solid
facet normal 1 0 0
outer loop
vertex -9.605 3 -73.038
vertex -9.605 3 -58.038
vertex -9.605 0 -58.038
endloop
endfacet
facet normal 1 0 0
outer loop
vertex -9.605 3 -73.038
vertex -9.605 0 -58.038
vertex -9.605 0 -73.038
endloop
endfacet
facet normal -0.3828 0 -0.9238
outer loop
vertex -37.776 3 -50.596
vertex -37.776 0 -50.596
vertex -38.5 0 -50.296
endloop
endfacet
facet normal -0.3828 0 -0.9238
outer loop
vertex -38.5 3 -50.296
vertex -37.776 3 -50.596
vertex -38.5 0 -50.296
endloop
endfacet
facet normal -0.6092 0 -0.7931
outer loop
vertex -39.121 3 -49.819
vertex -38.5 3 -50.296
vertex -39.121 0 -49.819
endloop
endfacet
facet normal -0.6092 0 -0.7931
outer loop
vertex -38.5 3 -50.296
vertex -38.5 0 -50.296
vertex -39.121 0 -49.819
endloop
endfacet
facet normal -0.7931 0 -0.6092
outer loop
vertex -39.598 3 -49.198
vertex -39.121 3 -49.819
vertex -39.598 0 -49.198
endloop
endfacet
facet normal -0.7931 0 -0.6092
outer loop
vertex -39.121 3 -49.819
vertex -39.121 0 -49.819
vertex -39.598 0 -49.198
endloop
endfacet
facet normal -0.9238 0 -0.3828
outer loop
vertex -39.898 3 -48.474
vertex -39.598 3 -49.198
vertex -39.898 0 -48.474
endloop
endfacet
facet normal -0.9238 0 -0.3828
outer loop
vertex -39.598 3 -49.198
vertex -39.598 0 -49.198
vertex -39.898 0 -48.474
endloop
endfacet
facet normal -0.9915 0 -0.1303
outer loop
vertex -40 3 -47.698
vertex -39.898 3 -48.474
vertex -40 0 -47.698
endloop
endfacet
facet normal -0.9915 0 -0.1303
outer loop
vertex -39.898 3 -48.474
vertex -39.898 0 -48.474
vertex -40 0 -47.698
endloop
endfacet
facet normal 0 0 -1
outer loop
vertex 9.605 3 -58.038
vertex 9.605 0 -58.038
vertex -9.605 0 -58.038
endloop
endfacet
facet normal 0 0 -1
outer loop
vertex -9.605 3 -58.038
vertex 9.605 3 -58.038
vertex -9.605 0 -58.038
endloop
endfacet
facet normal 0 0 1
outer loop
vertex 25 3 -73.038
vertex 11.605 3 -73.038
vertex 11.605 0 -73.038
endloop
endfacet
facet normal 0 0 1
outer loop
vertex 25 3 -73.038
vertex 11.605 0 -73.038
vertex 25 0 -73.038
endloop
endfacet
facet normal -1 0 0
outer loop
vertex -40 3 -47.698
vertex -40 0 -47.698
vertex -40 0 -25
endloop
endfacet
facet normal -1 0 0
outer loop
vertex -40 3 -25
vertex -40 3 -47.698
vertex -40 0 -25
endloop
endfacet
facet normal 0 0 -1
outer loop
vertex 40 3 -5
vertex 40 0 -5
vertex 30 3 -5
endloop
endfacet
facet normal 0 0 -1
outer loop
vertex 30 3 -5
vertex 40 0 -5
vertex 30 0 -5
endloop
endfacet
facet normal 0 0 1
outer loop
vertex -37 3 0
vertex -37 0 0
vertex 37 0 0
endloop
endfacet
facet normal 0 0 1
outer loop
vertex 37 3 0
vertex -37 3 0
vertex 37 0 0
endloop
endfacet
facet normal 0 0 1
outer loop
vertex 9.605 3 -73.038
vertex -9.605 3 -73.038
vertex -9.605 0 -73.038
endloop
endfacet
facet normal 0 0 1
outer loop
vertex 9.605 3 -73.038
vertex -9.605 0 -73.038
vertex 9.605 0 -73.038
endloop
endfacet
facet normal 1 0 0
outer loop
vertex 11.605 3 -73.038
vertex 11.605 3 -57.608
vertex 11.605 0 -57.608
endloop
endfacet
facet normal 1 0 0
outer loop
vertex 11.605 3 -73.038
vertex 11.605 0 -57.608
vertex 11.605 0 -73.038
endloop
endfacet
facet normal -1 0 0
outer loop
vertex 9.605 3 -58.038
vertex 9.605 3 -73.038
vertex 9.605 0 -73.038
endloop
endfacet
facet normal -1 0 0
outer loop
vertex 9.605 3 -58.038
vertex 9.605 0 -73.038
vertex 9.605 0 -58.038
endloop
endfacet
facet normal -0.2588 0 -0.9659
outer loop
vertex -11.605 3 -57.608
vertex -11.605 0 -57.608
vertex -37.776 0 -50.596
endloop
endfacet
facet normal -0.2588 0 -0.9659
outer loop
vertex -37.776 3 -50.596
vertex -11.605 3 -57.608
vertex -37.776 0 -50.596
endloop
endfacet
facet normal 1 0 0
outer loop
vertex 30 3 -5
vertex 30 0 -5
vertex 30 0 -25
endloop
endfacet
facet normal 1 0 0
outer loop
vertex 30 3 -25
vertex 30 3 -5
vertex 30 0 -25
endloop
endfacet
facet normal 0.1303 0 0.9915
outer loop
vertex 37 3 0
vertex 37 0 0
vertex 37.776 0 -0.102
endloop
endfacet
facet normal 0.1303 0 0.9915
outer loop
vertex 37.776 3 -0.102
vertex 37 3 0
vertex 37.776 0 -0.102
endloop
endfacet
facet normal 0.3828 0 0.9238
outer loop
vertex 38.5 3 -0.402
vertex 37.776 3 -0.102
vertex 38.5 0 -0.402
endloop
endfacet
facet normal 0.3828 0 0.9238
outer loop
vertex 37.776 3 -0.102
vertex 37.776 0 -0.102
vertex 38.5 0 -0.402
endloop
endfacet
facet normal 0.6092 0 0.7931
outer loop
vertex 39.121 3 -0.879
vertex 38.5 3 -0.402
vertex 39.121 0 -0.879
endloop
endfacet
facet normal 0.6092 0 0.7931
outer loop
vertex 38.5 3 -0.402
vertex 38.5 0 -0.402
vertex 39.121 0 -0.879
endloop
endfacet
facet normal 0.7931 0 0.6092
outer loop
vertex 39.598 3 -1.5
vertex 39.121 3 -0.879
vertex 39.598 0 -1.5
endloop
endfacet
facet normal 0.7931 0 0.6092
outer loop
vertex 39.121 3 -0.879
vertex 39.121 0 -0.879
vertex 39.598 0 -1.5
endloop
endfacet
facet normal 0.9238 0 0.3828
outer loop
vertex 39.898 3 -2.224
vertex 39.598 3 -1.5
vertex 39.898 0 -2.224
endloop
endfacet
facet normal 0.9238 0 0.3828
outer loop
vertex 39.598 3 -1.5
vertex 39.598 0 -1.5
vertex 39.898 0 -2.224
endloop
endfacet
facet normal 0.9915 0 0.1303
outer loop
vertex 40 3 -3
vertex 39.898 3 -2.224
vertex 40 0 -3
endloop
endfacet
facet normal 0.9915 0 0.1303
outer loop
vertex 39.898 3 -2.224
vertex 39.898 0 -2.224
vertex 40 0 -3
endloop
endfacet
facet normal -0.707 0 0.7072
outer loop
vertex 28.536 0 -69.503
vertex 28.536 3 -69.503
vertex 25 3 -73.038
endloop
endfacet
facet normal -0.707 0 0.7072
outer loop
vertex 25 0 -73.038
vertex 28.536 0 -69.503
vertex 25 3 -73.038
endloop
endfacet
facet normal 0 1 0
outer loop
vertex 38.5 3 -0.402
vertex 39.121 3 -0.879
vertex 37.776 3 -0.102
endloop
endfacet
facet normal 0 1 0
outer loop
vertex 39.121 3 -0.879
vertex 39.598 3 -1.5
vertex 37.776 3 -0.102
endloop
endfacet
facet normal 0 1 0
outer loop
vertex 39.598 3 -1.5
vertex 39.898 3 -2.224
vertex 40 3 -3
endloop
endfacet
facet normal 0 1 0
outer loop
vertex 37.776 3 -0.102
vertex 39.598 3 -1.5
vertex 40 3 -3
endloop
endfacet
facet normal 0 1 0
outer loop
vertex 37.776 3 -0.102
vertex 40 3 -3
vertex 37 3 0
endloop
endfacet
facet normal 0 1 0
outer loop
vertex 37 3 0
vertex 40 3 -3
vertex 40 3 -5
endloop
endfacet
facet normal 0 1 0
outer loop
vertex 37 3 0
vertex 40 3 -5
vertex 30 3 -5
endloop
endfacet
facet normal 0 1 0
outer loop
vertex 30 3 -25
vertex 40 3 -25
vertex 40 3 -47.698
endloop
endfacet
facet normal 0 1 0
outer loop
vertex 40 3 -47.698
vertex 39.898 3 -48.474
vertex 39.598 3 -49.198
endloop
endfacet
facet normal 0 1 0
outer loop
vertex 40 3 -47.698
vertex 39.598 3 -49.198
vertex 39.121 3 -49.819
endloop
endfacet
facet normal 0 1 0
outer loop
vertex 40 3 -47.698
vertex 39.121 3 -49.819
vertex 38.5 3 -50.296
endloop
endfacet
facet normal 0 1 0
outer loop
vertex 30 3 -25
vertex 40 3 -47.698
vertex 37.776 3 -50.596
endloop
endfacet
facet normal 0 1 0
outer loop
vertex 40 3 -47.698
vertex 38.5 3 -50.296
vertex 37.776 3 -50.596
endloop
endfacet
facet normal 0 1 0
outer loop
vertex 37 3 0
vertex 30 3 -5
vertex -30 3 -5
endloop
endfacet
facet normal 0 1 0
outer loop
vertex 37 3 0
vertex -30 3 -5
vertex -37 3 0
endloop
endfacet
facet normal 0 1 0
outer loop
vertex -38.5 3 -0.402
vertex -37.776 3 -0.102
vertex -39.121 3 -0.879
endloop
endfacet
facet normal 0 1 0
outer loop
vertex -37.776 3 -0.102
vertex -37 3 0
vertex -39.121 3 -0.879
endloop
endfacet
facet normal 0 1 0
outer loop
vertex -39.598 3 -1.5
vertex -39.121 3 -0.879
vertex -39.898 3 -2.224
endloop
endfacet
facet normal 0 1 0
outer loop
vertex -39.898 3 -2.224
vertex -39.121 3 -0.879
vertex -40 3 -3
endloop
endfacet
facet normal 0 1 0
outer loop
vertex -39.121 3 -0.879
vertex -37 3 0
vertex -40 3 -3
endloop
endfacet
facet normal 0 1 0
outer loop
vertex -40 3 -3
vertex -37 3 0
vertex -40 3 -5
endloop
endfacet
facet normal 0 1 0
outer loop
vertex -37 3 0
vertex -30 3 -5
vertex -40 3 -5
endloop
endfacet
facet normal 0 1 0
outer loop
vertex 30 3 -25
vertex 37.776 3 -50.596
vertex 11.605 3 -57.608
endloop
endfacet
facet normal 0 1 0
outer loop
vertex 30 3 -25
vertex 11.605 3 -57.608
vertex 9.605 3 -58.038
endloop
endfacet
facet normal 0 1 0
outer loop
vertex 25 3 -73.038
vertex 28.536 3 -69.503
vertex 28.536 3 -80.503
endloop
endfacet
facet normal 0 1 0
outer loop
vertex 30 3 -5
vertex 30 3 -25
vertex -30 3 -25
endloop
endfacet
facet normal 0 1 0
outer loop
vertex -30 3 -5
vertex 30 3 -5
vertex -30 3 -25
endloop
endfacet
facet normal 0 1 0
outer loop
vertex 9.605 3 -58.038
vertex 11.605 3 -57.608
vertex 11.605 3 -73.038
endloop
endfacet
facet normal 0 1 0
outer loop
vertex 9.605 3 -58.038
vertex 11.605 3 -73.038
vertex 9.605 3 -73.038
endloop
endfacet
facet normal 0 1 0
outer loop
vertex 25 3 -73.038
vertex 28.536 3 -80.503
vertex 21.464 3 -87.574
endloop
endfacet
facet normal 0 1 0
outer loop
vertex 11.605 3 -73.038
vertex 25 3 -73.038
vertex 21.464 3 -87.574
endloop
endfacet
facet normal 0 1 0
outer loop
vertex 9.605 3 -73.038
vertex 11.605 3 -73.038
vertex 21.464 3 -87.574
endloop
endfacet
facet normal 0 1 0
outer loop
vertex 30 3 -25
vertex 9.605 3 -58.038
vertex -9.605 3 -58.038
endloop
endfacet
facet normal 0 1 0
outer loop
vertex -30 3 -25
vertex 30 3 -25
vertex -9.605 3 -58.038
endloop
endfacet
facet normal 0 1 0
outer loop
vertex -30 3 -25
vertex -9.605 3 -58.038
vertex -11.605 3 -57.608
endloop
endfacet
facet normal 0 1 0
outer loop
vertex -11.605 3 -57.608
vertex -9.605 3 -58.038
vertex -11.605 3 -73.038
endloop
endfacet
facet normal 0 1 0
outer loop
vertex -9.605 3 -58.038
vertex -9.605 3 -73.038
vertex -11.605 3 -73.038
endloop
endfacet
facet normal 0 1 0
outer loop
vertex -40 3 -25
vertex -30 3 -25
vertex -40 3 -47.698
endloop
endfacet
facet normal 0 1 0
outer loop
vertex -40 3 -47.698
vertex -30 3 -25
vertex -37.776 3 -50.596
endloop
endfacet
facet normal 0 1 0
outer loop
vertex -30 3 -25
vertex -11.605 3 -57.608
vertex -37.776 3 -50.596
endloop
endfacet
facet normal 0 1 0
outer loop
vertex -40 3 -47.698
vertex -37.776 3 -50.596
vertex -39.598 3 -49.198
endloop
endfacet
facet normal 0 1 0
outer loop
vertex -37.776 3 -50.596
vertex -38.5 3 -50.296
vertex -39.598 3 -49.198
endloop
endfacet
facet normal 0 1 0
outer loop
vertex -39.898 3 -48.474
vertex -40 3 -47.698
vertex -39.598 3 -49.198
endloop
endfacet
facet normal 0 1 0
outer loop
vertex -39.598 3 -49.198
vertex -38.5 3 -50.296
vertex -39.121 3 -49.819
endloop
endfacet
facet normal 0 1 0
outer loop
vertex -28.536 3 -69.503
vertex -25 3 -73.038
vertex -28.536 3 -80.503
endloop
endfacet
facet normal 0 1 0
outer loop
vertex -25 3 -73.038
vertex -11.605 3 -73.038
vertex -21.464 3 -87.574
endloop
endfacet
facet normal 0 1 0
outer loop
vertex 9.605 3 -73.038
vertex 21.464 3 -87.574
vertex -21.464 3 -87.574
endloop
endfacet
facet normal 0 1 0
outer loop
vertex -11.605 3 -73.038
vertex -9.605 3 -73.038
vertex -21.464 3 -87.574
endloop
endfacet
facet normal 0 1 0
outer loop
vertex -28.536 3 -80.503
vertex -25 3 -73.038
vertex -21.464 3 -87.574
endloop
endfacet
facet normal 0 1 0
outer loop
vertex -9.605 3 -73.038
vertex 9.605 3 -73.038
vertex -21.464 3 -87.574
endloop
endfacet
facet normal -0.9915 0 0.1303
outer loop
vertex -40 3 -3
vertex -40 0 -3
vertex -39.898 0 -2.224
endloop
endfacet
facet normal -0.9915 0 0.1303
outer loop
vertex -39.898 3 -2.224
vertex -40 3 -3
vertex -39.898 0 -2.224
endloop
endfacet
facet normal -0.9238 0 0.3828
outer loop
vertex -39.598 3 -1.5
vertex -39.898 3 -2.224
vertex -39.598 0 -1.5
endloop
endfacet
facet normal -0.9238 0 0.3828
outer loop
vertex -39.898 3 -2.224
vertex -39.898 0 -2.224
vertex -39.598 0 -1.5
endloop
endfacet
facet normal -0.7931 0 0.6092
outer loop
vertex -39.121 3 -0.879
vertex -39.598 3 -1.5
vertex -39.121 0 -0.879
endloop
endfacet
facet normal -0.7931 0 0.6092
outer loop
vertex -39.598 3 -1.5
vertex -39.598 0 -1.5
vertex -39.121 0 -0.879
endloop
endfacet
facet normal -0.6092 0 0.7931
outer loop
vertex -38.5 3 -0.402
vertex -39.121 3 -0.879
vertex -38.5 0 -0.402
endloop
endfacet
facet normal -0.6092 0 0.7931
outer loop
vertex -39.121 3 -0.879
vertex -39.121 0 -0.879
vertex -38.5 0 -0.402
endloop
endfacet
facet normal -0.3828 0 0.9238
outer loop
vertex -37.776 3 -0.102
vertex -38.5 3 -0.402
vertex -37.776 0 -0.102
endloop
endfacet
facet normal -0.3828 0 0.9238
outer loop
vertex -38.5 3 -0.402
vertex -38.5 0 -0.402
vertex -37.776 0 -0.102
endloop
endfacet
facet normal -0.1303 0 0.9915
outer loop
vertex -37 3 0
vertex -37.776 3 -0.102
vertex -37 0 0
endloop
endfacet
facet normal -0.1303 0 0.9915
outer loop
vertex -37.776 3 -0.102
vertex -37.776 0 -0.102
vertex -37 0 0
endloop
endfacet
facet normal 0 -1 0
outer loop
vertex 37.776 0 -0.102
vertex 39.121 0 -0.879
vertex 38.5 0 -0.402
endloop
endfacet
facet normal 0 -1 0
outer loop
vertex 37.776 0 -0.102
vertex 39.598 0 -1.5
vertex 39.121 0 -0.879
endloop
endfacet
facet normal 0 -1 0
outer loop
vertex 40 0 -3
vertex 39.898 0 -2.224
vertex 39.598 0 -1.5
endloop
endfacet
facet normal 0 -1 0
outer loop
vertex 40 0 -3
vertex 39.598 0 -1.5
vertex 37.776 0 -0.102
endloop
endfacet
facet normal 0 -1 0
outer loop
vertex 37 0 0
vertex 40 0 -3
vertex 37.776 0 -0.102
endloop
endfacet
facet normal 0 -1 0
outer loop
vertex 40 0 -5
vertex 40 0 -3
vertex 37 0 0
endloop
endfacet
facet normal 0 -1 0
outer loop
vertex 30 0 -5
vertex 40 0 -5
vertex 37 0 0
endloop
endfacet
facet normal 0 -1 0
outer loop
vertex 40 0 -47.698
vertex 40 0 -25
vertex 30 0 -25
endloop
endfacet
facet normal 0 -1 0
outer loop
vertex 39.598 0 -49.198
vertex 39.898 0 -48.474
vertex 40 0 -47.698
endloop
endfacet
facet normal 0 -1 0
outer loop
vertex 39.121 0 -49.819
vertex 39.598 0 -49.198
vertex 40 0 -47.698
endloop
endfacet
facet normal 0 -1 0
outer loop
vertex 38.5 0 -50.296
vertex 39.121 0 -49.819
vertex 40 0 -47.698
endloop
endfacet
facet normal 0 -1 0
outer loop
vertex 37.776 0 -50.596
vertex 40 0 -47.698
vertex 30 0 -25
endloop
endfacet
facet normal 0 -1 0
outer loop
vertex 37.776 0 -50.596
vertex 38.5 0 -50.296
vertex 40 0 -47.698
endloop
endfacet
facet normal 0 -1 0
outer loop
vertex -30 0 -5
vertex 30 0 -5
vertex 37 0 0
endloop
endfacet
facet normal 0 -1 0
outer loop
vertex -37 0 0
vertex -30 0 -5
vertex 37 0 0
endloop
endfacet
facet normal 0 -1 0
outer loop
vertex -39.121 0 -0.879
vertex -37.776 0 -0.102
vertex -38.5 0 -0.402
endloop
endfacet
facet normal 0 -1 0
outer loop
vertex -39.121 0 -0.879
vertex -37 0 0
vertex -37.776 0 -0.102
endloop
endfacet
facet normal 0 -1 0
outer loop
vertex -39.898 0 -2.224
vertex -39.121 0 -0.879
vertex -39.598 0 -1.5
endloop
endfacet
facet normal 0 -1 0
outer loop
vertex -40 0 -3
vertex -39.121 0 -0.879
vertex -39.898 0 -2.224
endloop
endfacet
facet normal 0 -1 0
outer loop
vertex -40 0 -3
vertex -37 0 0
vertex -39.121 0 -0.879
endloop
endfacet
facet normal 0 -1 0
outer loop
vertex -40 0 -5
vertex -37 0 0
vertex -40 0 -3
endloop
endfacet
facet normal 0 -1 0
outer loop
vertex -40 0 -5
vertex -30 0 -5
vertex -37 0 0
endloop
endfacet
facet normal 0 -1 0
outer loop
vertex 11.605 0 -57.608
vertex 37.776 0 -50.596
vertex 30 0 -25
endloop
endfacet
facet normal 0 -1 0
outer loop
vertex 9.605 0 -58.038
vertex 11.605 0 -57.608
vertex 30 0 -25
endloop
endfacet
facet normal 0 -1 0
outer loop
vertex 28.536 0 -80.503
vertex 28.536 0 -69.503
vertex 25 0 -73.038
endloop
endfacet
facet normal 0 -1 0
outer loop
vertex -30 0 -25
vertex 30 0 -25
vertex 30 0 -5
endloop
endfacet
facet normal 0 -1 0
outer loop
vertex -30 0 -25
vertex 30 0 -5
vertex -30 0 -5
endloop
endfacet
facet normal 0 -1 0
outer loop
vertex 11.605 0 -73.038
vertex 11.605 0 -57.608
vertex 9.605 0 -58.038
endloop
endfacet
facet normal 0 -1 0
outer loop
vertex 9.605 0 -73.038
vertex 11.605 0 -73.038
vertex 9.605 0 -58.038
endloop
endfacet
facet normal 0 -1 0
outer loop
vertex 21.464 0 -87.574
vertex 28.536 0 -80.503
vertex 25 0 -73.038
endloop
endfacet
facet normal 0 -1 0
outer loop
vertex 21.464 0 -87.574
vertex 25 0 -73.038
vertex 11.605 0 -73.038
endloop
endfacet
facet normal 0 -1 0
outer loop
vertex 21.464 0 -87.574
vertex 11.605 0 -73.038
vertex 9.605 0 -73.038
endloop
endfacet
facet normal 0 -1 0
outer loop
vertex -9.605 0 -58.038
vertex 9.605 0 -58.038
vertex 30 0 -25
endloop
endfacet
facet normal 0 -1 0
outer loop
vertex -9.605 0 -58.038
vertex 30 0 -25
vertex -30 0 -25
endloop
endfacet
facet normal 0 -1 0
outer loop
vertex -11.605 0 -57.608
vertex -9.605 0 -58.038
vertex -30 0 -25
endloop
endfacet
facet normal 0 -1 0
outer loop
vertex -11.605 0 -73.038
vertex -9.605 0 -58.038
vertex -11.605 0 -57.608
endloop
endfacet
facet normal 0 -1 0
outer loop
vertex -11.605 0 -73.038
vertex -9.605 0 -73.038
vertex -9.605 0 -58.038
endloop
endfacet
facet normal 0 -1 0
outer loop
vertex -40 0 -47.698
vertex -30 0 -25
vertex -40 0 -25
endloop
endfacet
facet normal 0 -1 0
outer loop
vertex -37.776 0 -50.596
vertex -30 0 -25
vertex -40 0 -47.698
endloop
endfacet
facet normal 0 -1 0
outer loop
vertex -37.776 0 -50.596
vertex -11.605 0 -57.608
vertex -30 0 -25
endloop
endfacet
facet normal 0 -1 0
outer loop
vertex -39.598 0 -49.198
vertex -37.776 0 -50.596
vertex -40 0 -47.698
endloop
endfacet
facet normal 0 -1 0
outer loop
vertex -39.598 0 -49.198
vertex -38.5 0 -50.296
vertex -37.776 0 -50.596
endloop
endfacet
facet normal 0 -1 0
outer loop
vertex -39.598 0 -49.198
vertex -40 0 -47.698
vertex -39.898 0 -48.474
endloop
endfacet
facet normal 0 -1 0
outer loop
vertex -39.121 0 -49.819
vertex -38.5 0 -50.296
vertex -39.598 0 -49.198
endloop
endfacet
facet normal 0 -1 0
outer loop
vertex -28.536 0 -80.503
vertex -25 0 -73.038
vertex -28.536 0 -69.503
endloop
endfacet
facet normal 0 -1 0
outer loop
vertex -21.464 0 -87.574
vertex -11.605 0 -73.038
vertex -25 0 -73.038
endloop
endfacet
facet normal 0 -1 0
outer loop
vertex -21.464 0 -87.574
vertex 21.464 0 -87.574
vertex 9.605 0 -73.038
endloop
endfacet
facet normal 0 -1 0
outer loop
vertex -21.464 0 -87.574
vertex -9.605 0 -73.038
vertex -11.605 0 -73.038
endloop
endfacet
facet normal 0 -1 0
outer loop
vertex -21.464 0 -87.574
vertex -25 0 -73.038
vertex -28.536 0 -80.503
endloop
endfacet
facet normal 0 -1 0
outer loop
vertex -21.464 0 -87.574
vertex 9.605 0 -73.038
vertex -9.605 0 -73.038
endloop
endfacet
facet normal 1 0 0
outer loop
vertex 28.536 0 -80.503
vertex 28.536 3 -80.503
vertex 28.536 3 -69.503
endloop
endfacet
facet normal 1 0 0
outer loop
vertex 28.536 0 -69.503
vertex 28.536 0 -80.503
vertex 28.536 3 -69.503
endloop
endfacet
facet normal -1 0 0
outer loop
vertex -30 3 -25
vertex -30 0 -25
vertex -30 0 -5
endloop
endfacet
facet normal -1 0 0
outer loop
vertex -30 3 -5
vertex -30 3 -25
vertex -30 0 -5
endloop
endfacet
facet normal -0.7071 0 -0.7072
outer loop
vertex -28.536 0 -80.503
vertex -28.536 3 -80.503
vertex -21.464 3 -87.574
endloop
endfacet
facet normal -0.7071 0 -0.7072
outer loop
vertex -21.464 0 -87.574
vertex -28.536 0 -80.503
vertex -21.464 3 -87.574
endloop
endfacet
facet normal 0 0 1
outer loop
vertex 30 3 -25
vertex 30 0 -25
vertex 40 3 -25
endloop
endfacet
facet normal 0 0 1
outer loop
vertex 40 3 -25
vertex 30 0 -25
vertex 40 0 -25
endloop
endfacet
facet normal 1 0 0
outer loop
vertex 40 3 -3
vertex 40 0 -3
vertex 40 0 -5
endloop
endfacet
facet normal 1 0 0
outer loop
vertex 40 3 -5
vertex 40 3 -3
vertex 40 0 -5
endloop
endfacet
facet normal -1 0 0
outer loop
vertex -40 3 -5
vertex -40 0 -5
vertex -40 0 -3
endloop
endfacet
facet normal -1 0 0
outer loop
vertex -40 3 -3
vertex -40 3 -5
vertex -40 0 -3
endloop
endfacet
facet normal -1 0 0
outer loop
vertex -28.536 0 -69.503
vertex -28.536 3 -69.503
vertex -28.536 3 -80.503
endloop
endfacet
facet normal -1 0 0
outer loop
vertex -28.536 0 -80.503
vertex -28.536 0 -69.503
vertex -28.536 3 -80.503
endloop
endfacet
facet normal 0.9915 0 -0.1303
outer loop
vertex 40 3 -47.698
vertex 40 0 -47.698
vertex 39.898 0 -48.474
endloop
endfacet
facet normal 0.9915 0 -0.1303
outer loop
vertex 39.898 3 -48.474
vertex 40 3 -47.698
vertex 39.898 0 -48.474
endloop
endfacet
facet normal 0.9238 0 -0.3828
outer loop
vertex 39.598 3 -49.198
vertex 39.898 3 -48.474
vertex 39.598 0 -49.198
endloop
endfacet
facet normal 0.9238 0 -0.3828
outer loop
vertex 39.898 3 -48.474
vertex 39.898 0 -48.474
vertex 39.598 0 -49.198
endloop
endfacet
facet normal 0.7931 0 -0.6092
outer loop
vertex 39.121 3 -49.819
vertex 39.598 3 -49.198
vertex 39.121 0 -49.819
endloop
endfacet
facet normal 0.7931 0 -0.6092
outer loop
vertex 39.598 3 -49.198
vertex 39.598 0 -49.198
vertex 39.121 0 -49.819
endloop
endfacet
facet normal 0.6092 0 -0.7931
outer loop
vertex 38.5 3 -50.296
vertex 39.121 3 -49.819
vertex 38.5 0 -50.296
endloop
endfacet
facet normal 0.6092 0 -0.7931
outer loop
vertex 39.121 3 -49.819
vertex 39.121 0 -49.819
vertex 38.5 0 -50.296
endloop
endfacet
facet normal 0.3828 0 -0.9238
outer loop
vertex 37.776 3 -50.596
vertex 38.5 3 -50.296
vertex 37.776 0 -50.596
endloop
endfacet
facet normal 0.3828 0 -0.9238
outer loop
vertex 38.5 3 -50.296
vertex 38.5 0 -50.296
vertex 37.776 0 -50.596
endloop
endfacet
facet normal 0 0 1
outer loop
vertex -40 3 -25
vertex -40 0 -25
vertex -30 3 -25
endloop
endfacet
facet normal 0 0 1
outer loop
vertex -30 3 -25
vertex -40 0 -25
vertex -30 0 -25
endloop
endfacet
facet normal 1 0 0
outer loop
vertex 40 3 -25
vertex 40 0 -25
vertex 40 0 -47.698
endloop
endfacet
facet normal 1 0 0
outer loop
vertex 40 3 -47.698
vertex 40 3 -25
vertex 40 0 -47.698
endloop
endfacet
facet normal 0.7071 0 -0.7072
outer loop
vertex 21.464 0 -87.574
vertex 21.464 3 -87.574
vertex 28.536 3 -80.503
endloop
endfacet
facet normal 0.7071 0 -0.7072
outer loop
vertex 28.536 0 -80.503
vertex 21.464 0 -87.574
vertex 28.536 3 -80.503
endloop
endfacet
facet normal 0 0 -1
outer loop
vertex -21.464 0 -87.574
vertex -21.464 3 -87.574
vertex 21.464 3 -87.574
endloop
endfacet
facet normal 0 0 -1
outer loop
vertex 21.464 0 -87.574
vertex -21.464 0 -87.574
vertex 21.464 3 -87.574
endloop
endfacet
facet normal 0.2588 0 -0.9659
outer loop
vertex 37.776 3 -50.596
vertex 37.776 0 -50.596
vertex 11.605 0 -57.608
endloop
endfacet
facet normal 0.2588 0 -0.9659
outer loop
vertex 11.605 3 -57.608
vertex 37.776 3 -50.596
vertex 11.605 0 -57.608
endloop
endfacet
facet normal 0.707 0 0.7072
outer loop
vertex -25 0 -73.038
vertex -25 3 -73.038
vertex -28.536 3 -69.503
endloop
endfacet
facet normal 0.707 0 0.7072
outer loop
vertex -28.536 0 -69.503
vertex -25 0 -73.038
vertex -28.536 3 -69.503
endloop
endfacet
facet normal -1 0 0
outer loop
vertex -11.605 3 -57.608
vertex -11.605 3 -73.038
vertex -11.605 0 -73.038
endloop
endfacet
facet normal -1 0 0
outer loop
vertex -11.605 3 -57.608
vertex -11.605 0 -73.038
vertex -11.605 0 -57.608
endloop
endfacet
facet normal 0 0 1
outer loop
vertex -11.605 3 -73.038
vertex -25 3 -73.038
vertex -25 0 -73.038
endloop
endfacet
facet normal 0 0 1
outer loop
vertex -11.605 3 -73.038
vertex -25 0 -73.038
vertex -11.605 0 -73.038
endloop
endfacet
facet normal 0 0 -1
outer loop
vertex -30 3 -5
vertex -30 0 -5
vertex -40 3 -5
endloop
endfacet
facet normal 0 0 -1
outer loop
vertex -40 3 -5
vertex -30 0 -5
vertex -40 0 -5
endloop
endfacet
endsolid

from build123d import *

# Parameters (mm, degrees)
BOSS_EXTRUDE1_DEPTH = 3
BOSS_EXTRUDE2_DEPTH = 3
BOSS_EXTRUDE3_DEPTH = 3


with BuildPart() as part:
    # Sketch1 → Boss-Extrude1 (new body)
    with BuildSketch(Plane(origin=(0, 0, 0), x_dir=(1, 0, 0), z_dir=(0, 1, 0))):
        with BuildLine():
            Line((9.605042507, 58.038475773), (-9.605042507, 58.038475773))
            ThreePointArc((-9.605042507, 58.038475773), (-9.996621084, 58.012810357), (-10.381499643, 57.936253252))
            Line((-10.381499643, 57.936253252), (-37.776457135, 50.595796515))
            ThreePointArc((-37.776457135, 50.595796515), (-39.380060021, 49.524303323), (-40, 47.698019036))
            Line((-40, 47.698019036), (-40, 25))
            Line((-40, 25), (-30, 25))
            Line((-30, 25), (-30, 5))
            Line((-30, 5), (-40, 5))
            Line((-40, 5), (-40, 3))
            ThreePointArc((-40, 3), (-39.121320344, 0.878679656), (-37, 0))
            Line((-37, 0), (37, 0))
            ThreePointArc((37, 0), (39.121320344, 0.878679656), (40, 3))
            Line((40, 3), (40, 5))
            Line((40, 5), (30, 5))
            Line((30, 5), (30, 25))
            Line((30, 25), (40, 25))
            Line((40, 25), (40, 47.698019036))
            ThreePointArc((40, 47.698019036), (39.380060021, 49.524303323), (37.776457135, 50.595796515))
            Line((37.776457135, 50.595796515), (10.381499643, 57.936253252))
            ThreePointArc((10.381499643, 57.936253252), (9.996621084, 58.012810357), (9.605042507, 58.038475773))
        make_face()
    extrude(amount=BOSS_EXTRUDE1_DEPTH)

    # Sketch3 → Boss-Extrude2 (add)
    with BuildSketch(Plane(origin=(0, 3, 0), x_dir=(1, 0, 0), z_dir=(0, 1, 0))):
        Polygon((-11.605042507, 57.608405929), (-9.605042507, 58.038475773), (-9.605042507, 73.038475773), (-11.605042507, 73.038475773), align=None)
        Polygon((9.605042507, 73.038475773), (9.605042507, 58.038475773), (11.605042507, 57.608405929), (11.605042507, 73.038475773), align=None)
    extrude(amount=-BOSS_EXTRUDE2_DEPTH)

    # Sketch4 → Boss-Extrude3 (add)
    with BuildSketch(Plane(origin=(0, 3, 0), x_dir=(1, 0, 0), z_dir=(0, 1, 0))):
        Polygon((0, 73.038475773), (-25, 73.038475773), (-28.535533906, 69.502941867), (-28.535533906, 80.502941867), (-21.464466094, 87.574009679), (21.464466094, 87.574009679), (28.535533906, 80.502941867), (28.535533906, 69.502941867), (25, 73.038475773), align=None)
    extrude(amount=-BOSS_EXTRUDE3_DEPTH)


solid = part.part
